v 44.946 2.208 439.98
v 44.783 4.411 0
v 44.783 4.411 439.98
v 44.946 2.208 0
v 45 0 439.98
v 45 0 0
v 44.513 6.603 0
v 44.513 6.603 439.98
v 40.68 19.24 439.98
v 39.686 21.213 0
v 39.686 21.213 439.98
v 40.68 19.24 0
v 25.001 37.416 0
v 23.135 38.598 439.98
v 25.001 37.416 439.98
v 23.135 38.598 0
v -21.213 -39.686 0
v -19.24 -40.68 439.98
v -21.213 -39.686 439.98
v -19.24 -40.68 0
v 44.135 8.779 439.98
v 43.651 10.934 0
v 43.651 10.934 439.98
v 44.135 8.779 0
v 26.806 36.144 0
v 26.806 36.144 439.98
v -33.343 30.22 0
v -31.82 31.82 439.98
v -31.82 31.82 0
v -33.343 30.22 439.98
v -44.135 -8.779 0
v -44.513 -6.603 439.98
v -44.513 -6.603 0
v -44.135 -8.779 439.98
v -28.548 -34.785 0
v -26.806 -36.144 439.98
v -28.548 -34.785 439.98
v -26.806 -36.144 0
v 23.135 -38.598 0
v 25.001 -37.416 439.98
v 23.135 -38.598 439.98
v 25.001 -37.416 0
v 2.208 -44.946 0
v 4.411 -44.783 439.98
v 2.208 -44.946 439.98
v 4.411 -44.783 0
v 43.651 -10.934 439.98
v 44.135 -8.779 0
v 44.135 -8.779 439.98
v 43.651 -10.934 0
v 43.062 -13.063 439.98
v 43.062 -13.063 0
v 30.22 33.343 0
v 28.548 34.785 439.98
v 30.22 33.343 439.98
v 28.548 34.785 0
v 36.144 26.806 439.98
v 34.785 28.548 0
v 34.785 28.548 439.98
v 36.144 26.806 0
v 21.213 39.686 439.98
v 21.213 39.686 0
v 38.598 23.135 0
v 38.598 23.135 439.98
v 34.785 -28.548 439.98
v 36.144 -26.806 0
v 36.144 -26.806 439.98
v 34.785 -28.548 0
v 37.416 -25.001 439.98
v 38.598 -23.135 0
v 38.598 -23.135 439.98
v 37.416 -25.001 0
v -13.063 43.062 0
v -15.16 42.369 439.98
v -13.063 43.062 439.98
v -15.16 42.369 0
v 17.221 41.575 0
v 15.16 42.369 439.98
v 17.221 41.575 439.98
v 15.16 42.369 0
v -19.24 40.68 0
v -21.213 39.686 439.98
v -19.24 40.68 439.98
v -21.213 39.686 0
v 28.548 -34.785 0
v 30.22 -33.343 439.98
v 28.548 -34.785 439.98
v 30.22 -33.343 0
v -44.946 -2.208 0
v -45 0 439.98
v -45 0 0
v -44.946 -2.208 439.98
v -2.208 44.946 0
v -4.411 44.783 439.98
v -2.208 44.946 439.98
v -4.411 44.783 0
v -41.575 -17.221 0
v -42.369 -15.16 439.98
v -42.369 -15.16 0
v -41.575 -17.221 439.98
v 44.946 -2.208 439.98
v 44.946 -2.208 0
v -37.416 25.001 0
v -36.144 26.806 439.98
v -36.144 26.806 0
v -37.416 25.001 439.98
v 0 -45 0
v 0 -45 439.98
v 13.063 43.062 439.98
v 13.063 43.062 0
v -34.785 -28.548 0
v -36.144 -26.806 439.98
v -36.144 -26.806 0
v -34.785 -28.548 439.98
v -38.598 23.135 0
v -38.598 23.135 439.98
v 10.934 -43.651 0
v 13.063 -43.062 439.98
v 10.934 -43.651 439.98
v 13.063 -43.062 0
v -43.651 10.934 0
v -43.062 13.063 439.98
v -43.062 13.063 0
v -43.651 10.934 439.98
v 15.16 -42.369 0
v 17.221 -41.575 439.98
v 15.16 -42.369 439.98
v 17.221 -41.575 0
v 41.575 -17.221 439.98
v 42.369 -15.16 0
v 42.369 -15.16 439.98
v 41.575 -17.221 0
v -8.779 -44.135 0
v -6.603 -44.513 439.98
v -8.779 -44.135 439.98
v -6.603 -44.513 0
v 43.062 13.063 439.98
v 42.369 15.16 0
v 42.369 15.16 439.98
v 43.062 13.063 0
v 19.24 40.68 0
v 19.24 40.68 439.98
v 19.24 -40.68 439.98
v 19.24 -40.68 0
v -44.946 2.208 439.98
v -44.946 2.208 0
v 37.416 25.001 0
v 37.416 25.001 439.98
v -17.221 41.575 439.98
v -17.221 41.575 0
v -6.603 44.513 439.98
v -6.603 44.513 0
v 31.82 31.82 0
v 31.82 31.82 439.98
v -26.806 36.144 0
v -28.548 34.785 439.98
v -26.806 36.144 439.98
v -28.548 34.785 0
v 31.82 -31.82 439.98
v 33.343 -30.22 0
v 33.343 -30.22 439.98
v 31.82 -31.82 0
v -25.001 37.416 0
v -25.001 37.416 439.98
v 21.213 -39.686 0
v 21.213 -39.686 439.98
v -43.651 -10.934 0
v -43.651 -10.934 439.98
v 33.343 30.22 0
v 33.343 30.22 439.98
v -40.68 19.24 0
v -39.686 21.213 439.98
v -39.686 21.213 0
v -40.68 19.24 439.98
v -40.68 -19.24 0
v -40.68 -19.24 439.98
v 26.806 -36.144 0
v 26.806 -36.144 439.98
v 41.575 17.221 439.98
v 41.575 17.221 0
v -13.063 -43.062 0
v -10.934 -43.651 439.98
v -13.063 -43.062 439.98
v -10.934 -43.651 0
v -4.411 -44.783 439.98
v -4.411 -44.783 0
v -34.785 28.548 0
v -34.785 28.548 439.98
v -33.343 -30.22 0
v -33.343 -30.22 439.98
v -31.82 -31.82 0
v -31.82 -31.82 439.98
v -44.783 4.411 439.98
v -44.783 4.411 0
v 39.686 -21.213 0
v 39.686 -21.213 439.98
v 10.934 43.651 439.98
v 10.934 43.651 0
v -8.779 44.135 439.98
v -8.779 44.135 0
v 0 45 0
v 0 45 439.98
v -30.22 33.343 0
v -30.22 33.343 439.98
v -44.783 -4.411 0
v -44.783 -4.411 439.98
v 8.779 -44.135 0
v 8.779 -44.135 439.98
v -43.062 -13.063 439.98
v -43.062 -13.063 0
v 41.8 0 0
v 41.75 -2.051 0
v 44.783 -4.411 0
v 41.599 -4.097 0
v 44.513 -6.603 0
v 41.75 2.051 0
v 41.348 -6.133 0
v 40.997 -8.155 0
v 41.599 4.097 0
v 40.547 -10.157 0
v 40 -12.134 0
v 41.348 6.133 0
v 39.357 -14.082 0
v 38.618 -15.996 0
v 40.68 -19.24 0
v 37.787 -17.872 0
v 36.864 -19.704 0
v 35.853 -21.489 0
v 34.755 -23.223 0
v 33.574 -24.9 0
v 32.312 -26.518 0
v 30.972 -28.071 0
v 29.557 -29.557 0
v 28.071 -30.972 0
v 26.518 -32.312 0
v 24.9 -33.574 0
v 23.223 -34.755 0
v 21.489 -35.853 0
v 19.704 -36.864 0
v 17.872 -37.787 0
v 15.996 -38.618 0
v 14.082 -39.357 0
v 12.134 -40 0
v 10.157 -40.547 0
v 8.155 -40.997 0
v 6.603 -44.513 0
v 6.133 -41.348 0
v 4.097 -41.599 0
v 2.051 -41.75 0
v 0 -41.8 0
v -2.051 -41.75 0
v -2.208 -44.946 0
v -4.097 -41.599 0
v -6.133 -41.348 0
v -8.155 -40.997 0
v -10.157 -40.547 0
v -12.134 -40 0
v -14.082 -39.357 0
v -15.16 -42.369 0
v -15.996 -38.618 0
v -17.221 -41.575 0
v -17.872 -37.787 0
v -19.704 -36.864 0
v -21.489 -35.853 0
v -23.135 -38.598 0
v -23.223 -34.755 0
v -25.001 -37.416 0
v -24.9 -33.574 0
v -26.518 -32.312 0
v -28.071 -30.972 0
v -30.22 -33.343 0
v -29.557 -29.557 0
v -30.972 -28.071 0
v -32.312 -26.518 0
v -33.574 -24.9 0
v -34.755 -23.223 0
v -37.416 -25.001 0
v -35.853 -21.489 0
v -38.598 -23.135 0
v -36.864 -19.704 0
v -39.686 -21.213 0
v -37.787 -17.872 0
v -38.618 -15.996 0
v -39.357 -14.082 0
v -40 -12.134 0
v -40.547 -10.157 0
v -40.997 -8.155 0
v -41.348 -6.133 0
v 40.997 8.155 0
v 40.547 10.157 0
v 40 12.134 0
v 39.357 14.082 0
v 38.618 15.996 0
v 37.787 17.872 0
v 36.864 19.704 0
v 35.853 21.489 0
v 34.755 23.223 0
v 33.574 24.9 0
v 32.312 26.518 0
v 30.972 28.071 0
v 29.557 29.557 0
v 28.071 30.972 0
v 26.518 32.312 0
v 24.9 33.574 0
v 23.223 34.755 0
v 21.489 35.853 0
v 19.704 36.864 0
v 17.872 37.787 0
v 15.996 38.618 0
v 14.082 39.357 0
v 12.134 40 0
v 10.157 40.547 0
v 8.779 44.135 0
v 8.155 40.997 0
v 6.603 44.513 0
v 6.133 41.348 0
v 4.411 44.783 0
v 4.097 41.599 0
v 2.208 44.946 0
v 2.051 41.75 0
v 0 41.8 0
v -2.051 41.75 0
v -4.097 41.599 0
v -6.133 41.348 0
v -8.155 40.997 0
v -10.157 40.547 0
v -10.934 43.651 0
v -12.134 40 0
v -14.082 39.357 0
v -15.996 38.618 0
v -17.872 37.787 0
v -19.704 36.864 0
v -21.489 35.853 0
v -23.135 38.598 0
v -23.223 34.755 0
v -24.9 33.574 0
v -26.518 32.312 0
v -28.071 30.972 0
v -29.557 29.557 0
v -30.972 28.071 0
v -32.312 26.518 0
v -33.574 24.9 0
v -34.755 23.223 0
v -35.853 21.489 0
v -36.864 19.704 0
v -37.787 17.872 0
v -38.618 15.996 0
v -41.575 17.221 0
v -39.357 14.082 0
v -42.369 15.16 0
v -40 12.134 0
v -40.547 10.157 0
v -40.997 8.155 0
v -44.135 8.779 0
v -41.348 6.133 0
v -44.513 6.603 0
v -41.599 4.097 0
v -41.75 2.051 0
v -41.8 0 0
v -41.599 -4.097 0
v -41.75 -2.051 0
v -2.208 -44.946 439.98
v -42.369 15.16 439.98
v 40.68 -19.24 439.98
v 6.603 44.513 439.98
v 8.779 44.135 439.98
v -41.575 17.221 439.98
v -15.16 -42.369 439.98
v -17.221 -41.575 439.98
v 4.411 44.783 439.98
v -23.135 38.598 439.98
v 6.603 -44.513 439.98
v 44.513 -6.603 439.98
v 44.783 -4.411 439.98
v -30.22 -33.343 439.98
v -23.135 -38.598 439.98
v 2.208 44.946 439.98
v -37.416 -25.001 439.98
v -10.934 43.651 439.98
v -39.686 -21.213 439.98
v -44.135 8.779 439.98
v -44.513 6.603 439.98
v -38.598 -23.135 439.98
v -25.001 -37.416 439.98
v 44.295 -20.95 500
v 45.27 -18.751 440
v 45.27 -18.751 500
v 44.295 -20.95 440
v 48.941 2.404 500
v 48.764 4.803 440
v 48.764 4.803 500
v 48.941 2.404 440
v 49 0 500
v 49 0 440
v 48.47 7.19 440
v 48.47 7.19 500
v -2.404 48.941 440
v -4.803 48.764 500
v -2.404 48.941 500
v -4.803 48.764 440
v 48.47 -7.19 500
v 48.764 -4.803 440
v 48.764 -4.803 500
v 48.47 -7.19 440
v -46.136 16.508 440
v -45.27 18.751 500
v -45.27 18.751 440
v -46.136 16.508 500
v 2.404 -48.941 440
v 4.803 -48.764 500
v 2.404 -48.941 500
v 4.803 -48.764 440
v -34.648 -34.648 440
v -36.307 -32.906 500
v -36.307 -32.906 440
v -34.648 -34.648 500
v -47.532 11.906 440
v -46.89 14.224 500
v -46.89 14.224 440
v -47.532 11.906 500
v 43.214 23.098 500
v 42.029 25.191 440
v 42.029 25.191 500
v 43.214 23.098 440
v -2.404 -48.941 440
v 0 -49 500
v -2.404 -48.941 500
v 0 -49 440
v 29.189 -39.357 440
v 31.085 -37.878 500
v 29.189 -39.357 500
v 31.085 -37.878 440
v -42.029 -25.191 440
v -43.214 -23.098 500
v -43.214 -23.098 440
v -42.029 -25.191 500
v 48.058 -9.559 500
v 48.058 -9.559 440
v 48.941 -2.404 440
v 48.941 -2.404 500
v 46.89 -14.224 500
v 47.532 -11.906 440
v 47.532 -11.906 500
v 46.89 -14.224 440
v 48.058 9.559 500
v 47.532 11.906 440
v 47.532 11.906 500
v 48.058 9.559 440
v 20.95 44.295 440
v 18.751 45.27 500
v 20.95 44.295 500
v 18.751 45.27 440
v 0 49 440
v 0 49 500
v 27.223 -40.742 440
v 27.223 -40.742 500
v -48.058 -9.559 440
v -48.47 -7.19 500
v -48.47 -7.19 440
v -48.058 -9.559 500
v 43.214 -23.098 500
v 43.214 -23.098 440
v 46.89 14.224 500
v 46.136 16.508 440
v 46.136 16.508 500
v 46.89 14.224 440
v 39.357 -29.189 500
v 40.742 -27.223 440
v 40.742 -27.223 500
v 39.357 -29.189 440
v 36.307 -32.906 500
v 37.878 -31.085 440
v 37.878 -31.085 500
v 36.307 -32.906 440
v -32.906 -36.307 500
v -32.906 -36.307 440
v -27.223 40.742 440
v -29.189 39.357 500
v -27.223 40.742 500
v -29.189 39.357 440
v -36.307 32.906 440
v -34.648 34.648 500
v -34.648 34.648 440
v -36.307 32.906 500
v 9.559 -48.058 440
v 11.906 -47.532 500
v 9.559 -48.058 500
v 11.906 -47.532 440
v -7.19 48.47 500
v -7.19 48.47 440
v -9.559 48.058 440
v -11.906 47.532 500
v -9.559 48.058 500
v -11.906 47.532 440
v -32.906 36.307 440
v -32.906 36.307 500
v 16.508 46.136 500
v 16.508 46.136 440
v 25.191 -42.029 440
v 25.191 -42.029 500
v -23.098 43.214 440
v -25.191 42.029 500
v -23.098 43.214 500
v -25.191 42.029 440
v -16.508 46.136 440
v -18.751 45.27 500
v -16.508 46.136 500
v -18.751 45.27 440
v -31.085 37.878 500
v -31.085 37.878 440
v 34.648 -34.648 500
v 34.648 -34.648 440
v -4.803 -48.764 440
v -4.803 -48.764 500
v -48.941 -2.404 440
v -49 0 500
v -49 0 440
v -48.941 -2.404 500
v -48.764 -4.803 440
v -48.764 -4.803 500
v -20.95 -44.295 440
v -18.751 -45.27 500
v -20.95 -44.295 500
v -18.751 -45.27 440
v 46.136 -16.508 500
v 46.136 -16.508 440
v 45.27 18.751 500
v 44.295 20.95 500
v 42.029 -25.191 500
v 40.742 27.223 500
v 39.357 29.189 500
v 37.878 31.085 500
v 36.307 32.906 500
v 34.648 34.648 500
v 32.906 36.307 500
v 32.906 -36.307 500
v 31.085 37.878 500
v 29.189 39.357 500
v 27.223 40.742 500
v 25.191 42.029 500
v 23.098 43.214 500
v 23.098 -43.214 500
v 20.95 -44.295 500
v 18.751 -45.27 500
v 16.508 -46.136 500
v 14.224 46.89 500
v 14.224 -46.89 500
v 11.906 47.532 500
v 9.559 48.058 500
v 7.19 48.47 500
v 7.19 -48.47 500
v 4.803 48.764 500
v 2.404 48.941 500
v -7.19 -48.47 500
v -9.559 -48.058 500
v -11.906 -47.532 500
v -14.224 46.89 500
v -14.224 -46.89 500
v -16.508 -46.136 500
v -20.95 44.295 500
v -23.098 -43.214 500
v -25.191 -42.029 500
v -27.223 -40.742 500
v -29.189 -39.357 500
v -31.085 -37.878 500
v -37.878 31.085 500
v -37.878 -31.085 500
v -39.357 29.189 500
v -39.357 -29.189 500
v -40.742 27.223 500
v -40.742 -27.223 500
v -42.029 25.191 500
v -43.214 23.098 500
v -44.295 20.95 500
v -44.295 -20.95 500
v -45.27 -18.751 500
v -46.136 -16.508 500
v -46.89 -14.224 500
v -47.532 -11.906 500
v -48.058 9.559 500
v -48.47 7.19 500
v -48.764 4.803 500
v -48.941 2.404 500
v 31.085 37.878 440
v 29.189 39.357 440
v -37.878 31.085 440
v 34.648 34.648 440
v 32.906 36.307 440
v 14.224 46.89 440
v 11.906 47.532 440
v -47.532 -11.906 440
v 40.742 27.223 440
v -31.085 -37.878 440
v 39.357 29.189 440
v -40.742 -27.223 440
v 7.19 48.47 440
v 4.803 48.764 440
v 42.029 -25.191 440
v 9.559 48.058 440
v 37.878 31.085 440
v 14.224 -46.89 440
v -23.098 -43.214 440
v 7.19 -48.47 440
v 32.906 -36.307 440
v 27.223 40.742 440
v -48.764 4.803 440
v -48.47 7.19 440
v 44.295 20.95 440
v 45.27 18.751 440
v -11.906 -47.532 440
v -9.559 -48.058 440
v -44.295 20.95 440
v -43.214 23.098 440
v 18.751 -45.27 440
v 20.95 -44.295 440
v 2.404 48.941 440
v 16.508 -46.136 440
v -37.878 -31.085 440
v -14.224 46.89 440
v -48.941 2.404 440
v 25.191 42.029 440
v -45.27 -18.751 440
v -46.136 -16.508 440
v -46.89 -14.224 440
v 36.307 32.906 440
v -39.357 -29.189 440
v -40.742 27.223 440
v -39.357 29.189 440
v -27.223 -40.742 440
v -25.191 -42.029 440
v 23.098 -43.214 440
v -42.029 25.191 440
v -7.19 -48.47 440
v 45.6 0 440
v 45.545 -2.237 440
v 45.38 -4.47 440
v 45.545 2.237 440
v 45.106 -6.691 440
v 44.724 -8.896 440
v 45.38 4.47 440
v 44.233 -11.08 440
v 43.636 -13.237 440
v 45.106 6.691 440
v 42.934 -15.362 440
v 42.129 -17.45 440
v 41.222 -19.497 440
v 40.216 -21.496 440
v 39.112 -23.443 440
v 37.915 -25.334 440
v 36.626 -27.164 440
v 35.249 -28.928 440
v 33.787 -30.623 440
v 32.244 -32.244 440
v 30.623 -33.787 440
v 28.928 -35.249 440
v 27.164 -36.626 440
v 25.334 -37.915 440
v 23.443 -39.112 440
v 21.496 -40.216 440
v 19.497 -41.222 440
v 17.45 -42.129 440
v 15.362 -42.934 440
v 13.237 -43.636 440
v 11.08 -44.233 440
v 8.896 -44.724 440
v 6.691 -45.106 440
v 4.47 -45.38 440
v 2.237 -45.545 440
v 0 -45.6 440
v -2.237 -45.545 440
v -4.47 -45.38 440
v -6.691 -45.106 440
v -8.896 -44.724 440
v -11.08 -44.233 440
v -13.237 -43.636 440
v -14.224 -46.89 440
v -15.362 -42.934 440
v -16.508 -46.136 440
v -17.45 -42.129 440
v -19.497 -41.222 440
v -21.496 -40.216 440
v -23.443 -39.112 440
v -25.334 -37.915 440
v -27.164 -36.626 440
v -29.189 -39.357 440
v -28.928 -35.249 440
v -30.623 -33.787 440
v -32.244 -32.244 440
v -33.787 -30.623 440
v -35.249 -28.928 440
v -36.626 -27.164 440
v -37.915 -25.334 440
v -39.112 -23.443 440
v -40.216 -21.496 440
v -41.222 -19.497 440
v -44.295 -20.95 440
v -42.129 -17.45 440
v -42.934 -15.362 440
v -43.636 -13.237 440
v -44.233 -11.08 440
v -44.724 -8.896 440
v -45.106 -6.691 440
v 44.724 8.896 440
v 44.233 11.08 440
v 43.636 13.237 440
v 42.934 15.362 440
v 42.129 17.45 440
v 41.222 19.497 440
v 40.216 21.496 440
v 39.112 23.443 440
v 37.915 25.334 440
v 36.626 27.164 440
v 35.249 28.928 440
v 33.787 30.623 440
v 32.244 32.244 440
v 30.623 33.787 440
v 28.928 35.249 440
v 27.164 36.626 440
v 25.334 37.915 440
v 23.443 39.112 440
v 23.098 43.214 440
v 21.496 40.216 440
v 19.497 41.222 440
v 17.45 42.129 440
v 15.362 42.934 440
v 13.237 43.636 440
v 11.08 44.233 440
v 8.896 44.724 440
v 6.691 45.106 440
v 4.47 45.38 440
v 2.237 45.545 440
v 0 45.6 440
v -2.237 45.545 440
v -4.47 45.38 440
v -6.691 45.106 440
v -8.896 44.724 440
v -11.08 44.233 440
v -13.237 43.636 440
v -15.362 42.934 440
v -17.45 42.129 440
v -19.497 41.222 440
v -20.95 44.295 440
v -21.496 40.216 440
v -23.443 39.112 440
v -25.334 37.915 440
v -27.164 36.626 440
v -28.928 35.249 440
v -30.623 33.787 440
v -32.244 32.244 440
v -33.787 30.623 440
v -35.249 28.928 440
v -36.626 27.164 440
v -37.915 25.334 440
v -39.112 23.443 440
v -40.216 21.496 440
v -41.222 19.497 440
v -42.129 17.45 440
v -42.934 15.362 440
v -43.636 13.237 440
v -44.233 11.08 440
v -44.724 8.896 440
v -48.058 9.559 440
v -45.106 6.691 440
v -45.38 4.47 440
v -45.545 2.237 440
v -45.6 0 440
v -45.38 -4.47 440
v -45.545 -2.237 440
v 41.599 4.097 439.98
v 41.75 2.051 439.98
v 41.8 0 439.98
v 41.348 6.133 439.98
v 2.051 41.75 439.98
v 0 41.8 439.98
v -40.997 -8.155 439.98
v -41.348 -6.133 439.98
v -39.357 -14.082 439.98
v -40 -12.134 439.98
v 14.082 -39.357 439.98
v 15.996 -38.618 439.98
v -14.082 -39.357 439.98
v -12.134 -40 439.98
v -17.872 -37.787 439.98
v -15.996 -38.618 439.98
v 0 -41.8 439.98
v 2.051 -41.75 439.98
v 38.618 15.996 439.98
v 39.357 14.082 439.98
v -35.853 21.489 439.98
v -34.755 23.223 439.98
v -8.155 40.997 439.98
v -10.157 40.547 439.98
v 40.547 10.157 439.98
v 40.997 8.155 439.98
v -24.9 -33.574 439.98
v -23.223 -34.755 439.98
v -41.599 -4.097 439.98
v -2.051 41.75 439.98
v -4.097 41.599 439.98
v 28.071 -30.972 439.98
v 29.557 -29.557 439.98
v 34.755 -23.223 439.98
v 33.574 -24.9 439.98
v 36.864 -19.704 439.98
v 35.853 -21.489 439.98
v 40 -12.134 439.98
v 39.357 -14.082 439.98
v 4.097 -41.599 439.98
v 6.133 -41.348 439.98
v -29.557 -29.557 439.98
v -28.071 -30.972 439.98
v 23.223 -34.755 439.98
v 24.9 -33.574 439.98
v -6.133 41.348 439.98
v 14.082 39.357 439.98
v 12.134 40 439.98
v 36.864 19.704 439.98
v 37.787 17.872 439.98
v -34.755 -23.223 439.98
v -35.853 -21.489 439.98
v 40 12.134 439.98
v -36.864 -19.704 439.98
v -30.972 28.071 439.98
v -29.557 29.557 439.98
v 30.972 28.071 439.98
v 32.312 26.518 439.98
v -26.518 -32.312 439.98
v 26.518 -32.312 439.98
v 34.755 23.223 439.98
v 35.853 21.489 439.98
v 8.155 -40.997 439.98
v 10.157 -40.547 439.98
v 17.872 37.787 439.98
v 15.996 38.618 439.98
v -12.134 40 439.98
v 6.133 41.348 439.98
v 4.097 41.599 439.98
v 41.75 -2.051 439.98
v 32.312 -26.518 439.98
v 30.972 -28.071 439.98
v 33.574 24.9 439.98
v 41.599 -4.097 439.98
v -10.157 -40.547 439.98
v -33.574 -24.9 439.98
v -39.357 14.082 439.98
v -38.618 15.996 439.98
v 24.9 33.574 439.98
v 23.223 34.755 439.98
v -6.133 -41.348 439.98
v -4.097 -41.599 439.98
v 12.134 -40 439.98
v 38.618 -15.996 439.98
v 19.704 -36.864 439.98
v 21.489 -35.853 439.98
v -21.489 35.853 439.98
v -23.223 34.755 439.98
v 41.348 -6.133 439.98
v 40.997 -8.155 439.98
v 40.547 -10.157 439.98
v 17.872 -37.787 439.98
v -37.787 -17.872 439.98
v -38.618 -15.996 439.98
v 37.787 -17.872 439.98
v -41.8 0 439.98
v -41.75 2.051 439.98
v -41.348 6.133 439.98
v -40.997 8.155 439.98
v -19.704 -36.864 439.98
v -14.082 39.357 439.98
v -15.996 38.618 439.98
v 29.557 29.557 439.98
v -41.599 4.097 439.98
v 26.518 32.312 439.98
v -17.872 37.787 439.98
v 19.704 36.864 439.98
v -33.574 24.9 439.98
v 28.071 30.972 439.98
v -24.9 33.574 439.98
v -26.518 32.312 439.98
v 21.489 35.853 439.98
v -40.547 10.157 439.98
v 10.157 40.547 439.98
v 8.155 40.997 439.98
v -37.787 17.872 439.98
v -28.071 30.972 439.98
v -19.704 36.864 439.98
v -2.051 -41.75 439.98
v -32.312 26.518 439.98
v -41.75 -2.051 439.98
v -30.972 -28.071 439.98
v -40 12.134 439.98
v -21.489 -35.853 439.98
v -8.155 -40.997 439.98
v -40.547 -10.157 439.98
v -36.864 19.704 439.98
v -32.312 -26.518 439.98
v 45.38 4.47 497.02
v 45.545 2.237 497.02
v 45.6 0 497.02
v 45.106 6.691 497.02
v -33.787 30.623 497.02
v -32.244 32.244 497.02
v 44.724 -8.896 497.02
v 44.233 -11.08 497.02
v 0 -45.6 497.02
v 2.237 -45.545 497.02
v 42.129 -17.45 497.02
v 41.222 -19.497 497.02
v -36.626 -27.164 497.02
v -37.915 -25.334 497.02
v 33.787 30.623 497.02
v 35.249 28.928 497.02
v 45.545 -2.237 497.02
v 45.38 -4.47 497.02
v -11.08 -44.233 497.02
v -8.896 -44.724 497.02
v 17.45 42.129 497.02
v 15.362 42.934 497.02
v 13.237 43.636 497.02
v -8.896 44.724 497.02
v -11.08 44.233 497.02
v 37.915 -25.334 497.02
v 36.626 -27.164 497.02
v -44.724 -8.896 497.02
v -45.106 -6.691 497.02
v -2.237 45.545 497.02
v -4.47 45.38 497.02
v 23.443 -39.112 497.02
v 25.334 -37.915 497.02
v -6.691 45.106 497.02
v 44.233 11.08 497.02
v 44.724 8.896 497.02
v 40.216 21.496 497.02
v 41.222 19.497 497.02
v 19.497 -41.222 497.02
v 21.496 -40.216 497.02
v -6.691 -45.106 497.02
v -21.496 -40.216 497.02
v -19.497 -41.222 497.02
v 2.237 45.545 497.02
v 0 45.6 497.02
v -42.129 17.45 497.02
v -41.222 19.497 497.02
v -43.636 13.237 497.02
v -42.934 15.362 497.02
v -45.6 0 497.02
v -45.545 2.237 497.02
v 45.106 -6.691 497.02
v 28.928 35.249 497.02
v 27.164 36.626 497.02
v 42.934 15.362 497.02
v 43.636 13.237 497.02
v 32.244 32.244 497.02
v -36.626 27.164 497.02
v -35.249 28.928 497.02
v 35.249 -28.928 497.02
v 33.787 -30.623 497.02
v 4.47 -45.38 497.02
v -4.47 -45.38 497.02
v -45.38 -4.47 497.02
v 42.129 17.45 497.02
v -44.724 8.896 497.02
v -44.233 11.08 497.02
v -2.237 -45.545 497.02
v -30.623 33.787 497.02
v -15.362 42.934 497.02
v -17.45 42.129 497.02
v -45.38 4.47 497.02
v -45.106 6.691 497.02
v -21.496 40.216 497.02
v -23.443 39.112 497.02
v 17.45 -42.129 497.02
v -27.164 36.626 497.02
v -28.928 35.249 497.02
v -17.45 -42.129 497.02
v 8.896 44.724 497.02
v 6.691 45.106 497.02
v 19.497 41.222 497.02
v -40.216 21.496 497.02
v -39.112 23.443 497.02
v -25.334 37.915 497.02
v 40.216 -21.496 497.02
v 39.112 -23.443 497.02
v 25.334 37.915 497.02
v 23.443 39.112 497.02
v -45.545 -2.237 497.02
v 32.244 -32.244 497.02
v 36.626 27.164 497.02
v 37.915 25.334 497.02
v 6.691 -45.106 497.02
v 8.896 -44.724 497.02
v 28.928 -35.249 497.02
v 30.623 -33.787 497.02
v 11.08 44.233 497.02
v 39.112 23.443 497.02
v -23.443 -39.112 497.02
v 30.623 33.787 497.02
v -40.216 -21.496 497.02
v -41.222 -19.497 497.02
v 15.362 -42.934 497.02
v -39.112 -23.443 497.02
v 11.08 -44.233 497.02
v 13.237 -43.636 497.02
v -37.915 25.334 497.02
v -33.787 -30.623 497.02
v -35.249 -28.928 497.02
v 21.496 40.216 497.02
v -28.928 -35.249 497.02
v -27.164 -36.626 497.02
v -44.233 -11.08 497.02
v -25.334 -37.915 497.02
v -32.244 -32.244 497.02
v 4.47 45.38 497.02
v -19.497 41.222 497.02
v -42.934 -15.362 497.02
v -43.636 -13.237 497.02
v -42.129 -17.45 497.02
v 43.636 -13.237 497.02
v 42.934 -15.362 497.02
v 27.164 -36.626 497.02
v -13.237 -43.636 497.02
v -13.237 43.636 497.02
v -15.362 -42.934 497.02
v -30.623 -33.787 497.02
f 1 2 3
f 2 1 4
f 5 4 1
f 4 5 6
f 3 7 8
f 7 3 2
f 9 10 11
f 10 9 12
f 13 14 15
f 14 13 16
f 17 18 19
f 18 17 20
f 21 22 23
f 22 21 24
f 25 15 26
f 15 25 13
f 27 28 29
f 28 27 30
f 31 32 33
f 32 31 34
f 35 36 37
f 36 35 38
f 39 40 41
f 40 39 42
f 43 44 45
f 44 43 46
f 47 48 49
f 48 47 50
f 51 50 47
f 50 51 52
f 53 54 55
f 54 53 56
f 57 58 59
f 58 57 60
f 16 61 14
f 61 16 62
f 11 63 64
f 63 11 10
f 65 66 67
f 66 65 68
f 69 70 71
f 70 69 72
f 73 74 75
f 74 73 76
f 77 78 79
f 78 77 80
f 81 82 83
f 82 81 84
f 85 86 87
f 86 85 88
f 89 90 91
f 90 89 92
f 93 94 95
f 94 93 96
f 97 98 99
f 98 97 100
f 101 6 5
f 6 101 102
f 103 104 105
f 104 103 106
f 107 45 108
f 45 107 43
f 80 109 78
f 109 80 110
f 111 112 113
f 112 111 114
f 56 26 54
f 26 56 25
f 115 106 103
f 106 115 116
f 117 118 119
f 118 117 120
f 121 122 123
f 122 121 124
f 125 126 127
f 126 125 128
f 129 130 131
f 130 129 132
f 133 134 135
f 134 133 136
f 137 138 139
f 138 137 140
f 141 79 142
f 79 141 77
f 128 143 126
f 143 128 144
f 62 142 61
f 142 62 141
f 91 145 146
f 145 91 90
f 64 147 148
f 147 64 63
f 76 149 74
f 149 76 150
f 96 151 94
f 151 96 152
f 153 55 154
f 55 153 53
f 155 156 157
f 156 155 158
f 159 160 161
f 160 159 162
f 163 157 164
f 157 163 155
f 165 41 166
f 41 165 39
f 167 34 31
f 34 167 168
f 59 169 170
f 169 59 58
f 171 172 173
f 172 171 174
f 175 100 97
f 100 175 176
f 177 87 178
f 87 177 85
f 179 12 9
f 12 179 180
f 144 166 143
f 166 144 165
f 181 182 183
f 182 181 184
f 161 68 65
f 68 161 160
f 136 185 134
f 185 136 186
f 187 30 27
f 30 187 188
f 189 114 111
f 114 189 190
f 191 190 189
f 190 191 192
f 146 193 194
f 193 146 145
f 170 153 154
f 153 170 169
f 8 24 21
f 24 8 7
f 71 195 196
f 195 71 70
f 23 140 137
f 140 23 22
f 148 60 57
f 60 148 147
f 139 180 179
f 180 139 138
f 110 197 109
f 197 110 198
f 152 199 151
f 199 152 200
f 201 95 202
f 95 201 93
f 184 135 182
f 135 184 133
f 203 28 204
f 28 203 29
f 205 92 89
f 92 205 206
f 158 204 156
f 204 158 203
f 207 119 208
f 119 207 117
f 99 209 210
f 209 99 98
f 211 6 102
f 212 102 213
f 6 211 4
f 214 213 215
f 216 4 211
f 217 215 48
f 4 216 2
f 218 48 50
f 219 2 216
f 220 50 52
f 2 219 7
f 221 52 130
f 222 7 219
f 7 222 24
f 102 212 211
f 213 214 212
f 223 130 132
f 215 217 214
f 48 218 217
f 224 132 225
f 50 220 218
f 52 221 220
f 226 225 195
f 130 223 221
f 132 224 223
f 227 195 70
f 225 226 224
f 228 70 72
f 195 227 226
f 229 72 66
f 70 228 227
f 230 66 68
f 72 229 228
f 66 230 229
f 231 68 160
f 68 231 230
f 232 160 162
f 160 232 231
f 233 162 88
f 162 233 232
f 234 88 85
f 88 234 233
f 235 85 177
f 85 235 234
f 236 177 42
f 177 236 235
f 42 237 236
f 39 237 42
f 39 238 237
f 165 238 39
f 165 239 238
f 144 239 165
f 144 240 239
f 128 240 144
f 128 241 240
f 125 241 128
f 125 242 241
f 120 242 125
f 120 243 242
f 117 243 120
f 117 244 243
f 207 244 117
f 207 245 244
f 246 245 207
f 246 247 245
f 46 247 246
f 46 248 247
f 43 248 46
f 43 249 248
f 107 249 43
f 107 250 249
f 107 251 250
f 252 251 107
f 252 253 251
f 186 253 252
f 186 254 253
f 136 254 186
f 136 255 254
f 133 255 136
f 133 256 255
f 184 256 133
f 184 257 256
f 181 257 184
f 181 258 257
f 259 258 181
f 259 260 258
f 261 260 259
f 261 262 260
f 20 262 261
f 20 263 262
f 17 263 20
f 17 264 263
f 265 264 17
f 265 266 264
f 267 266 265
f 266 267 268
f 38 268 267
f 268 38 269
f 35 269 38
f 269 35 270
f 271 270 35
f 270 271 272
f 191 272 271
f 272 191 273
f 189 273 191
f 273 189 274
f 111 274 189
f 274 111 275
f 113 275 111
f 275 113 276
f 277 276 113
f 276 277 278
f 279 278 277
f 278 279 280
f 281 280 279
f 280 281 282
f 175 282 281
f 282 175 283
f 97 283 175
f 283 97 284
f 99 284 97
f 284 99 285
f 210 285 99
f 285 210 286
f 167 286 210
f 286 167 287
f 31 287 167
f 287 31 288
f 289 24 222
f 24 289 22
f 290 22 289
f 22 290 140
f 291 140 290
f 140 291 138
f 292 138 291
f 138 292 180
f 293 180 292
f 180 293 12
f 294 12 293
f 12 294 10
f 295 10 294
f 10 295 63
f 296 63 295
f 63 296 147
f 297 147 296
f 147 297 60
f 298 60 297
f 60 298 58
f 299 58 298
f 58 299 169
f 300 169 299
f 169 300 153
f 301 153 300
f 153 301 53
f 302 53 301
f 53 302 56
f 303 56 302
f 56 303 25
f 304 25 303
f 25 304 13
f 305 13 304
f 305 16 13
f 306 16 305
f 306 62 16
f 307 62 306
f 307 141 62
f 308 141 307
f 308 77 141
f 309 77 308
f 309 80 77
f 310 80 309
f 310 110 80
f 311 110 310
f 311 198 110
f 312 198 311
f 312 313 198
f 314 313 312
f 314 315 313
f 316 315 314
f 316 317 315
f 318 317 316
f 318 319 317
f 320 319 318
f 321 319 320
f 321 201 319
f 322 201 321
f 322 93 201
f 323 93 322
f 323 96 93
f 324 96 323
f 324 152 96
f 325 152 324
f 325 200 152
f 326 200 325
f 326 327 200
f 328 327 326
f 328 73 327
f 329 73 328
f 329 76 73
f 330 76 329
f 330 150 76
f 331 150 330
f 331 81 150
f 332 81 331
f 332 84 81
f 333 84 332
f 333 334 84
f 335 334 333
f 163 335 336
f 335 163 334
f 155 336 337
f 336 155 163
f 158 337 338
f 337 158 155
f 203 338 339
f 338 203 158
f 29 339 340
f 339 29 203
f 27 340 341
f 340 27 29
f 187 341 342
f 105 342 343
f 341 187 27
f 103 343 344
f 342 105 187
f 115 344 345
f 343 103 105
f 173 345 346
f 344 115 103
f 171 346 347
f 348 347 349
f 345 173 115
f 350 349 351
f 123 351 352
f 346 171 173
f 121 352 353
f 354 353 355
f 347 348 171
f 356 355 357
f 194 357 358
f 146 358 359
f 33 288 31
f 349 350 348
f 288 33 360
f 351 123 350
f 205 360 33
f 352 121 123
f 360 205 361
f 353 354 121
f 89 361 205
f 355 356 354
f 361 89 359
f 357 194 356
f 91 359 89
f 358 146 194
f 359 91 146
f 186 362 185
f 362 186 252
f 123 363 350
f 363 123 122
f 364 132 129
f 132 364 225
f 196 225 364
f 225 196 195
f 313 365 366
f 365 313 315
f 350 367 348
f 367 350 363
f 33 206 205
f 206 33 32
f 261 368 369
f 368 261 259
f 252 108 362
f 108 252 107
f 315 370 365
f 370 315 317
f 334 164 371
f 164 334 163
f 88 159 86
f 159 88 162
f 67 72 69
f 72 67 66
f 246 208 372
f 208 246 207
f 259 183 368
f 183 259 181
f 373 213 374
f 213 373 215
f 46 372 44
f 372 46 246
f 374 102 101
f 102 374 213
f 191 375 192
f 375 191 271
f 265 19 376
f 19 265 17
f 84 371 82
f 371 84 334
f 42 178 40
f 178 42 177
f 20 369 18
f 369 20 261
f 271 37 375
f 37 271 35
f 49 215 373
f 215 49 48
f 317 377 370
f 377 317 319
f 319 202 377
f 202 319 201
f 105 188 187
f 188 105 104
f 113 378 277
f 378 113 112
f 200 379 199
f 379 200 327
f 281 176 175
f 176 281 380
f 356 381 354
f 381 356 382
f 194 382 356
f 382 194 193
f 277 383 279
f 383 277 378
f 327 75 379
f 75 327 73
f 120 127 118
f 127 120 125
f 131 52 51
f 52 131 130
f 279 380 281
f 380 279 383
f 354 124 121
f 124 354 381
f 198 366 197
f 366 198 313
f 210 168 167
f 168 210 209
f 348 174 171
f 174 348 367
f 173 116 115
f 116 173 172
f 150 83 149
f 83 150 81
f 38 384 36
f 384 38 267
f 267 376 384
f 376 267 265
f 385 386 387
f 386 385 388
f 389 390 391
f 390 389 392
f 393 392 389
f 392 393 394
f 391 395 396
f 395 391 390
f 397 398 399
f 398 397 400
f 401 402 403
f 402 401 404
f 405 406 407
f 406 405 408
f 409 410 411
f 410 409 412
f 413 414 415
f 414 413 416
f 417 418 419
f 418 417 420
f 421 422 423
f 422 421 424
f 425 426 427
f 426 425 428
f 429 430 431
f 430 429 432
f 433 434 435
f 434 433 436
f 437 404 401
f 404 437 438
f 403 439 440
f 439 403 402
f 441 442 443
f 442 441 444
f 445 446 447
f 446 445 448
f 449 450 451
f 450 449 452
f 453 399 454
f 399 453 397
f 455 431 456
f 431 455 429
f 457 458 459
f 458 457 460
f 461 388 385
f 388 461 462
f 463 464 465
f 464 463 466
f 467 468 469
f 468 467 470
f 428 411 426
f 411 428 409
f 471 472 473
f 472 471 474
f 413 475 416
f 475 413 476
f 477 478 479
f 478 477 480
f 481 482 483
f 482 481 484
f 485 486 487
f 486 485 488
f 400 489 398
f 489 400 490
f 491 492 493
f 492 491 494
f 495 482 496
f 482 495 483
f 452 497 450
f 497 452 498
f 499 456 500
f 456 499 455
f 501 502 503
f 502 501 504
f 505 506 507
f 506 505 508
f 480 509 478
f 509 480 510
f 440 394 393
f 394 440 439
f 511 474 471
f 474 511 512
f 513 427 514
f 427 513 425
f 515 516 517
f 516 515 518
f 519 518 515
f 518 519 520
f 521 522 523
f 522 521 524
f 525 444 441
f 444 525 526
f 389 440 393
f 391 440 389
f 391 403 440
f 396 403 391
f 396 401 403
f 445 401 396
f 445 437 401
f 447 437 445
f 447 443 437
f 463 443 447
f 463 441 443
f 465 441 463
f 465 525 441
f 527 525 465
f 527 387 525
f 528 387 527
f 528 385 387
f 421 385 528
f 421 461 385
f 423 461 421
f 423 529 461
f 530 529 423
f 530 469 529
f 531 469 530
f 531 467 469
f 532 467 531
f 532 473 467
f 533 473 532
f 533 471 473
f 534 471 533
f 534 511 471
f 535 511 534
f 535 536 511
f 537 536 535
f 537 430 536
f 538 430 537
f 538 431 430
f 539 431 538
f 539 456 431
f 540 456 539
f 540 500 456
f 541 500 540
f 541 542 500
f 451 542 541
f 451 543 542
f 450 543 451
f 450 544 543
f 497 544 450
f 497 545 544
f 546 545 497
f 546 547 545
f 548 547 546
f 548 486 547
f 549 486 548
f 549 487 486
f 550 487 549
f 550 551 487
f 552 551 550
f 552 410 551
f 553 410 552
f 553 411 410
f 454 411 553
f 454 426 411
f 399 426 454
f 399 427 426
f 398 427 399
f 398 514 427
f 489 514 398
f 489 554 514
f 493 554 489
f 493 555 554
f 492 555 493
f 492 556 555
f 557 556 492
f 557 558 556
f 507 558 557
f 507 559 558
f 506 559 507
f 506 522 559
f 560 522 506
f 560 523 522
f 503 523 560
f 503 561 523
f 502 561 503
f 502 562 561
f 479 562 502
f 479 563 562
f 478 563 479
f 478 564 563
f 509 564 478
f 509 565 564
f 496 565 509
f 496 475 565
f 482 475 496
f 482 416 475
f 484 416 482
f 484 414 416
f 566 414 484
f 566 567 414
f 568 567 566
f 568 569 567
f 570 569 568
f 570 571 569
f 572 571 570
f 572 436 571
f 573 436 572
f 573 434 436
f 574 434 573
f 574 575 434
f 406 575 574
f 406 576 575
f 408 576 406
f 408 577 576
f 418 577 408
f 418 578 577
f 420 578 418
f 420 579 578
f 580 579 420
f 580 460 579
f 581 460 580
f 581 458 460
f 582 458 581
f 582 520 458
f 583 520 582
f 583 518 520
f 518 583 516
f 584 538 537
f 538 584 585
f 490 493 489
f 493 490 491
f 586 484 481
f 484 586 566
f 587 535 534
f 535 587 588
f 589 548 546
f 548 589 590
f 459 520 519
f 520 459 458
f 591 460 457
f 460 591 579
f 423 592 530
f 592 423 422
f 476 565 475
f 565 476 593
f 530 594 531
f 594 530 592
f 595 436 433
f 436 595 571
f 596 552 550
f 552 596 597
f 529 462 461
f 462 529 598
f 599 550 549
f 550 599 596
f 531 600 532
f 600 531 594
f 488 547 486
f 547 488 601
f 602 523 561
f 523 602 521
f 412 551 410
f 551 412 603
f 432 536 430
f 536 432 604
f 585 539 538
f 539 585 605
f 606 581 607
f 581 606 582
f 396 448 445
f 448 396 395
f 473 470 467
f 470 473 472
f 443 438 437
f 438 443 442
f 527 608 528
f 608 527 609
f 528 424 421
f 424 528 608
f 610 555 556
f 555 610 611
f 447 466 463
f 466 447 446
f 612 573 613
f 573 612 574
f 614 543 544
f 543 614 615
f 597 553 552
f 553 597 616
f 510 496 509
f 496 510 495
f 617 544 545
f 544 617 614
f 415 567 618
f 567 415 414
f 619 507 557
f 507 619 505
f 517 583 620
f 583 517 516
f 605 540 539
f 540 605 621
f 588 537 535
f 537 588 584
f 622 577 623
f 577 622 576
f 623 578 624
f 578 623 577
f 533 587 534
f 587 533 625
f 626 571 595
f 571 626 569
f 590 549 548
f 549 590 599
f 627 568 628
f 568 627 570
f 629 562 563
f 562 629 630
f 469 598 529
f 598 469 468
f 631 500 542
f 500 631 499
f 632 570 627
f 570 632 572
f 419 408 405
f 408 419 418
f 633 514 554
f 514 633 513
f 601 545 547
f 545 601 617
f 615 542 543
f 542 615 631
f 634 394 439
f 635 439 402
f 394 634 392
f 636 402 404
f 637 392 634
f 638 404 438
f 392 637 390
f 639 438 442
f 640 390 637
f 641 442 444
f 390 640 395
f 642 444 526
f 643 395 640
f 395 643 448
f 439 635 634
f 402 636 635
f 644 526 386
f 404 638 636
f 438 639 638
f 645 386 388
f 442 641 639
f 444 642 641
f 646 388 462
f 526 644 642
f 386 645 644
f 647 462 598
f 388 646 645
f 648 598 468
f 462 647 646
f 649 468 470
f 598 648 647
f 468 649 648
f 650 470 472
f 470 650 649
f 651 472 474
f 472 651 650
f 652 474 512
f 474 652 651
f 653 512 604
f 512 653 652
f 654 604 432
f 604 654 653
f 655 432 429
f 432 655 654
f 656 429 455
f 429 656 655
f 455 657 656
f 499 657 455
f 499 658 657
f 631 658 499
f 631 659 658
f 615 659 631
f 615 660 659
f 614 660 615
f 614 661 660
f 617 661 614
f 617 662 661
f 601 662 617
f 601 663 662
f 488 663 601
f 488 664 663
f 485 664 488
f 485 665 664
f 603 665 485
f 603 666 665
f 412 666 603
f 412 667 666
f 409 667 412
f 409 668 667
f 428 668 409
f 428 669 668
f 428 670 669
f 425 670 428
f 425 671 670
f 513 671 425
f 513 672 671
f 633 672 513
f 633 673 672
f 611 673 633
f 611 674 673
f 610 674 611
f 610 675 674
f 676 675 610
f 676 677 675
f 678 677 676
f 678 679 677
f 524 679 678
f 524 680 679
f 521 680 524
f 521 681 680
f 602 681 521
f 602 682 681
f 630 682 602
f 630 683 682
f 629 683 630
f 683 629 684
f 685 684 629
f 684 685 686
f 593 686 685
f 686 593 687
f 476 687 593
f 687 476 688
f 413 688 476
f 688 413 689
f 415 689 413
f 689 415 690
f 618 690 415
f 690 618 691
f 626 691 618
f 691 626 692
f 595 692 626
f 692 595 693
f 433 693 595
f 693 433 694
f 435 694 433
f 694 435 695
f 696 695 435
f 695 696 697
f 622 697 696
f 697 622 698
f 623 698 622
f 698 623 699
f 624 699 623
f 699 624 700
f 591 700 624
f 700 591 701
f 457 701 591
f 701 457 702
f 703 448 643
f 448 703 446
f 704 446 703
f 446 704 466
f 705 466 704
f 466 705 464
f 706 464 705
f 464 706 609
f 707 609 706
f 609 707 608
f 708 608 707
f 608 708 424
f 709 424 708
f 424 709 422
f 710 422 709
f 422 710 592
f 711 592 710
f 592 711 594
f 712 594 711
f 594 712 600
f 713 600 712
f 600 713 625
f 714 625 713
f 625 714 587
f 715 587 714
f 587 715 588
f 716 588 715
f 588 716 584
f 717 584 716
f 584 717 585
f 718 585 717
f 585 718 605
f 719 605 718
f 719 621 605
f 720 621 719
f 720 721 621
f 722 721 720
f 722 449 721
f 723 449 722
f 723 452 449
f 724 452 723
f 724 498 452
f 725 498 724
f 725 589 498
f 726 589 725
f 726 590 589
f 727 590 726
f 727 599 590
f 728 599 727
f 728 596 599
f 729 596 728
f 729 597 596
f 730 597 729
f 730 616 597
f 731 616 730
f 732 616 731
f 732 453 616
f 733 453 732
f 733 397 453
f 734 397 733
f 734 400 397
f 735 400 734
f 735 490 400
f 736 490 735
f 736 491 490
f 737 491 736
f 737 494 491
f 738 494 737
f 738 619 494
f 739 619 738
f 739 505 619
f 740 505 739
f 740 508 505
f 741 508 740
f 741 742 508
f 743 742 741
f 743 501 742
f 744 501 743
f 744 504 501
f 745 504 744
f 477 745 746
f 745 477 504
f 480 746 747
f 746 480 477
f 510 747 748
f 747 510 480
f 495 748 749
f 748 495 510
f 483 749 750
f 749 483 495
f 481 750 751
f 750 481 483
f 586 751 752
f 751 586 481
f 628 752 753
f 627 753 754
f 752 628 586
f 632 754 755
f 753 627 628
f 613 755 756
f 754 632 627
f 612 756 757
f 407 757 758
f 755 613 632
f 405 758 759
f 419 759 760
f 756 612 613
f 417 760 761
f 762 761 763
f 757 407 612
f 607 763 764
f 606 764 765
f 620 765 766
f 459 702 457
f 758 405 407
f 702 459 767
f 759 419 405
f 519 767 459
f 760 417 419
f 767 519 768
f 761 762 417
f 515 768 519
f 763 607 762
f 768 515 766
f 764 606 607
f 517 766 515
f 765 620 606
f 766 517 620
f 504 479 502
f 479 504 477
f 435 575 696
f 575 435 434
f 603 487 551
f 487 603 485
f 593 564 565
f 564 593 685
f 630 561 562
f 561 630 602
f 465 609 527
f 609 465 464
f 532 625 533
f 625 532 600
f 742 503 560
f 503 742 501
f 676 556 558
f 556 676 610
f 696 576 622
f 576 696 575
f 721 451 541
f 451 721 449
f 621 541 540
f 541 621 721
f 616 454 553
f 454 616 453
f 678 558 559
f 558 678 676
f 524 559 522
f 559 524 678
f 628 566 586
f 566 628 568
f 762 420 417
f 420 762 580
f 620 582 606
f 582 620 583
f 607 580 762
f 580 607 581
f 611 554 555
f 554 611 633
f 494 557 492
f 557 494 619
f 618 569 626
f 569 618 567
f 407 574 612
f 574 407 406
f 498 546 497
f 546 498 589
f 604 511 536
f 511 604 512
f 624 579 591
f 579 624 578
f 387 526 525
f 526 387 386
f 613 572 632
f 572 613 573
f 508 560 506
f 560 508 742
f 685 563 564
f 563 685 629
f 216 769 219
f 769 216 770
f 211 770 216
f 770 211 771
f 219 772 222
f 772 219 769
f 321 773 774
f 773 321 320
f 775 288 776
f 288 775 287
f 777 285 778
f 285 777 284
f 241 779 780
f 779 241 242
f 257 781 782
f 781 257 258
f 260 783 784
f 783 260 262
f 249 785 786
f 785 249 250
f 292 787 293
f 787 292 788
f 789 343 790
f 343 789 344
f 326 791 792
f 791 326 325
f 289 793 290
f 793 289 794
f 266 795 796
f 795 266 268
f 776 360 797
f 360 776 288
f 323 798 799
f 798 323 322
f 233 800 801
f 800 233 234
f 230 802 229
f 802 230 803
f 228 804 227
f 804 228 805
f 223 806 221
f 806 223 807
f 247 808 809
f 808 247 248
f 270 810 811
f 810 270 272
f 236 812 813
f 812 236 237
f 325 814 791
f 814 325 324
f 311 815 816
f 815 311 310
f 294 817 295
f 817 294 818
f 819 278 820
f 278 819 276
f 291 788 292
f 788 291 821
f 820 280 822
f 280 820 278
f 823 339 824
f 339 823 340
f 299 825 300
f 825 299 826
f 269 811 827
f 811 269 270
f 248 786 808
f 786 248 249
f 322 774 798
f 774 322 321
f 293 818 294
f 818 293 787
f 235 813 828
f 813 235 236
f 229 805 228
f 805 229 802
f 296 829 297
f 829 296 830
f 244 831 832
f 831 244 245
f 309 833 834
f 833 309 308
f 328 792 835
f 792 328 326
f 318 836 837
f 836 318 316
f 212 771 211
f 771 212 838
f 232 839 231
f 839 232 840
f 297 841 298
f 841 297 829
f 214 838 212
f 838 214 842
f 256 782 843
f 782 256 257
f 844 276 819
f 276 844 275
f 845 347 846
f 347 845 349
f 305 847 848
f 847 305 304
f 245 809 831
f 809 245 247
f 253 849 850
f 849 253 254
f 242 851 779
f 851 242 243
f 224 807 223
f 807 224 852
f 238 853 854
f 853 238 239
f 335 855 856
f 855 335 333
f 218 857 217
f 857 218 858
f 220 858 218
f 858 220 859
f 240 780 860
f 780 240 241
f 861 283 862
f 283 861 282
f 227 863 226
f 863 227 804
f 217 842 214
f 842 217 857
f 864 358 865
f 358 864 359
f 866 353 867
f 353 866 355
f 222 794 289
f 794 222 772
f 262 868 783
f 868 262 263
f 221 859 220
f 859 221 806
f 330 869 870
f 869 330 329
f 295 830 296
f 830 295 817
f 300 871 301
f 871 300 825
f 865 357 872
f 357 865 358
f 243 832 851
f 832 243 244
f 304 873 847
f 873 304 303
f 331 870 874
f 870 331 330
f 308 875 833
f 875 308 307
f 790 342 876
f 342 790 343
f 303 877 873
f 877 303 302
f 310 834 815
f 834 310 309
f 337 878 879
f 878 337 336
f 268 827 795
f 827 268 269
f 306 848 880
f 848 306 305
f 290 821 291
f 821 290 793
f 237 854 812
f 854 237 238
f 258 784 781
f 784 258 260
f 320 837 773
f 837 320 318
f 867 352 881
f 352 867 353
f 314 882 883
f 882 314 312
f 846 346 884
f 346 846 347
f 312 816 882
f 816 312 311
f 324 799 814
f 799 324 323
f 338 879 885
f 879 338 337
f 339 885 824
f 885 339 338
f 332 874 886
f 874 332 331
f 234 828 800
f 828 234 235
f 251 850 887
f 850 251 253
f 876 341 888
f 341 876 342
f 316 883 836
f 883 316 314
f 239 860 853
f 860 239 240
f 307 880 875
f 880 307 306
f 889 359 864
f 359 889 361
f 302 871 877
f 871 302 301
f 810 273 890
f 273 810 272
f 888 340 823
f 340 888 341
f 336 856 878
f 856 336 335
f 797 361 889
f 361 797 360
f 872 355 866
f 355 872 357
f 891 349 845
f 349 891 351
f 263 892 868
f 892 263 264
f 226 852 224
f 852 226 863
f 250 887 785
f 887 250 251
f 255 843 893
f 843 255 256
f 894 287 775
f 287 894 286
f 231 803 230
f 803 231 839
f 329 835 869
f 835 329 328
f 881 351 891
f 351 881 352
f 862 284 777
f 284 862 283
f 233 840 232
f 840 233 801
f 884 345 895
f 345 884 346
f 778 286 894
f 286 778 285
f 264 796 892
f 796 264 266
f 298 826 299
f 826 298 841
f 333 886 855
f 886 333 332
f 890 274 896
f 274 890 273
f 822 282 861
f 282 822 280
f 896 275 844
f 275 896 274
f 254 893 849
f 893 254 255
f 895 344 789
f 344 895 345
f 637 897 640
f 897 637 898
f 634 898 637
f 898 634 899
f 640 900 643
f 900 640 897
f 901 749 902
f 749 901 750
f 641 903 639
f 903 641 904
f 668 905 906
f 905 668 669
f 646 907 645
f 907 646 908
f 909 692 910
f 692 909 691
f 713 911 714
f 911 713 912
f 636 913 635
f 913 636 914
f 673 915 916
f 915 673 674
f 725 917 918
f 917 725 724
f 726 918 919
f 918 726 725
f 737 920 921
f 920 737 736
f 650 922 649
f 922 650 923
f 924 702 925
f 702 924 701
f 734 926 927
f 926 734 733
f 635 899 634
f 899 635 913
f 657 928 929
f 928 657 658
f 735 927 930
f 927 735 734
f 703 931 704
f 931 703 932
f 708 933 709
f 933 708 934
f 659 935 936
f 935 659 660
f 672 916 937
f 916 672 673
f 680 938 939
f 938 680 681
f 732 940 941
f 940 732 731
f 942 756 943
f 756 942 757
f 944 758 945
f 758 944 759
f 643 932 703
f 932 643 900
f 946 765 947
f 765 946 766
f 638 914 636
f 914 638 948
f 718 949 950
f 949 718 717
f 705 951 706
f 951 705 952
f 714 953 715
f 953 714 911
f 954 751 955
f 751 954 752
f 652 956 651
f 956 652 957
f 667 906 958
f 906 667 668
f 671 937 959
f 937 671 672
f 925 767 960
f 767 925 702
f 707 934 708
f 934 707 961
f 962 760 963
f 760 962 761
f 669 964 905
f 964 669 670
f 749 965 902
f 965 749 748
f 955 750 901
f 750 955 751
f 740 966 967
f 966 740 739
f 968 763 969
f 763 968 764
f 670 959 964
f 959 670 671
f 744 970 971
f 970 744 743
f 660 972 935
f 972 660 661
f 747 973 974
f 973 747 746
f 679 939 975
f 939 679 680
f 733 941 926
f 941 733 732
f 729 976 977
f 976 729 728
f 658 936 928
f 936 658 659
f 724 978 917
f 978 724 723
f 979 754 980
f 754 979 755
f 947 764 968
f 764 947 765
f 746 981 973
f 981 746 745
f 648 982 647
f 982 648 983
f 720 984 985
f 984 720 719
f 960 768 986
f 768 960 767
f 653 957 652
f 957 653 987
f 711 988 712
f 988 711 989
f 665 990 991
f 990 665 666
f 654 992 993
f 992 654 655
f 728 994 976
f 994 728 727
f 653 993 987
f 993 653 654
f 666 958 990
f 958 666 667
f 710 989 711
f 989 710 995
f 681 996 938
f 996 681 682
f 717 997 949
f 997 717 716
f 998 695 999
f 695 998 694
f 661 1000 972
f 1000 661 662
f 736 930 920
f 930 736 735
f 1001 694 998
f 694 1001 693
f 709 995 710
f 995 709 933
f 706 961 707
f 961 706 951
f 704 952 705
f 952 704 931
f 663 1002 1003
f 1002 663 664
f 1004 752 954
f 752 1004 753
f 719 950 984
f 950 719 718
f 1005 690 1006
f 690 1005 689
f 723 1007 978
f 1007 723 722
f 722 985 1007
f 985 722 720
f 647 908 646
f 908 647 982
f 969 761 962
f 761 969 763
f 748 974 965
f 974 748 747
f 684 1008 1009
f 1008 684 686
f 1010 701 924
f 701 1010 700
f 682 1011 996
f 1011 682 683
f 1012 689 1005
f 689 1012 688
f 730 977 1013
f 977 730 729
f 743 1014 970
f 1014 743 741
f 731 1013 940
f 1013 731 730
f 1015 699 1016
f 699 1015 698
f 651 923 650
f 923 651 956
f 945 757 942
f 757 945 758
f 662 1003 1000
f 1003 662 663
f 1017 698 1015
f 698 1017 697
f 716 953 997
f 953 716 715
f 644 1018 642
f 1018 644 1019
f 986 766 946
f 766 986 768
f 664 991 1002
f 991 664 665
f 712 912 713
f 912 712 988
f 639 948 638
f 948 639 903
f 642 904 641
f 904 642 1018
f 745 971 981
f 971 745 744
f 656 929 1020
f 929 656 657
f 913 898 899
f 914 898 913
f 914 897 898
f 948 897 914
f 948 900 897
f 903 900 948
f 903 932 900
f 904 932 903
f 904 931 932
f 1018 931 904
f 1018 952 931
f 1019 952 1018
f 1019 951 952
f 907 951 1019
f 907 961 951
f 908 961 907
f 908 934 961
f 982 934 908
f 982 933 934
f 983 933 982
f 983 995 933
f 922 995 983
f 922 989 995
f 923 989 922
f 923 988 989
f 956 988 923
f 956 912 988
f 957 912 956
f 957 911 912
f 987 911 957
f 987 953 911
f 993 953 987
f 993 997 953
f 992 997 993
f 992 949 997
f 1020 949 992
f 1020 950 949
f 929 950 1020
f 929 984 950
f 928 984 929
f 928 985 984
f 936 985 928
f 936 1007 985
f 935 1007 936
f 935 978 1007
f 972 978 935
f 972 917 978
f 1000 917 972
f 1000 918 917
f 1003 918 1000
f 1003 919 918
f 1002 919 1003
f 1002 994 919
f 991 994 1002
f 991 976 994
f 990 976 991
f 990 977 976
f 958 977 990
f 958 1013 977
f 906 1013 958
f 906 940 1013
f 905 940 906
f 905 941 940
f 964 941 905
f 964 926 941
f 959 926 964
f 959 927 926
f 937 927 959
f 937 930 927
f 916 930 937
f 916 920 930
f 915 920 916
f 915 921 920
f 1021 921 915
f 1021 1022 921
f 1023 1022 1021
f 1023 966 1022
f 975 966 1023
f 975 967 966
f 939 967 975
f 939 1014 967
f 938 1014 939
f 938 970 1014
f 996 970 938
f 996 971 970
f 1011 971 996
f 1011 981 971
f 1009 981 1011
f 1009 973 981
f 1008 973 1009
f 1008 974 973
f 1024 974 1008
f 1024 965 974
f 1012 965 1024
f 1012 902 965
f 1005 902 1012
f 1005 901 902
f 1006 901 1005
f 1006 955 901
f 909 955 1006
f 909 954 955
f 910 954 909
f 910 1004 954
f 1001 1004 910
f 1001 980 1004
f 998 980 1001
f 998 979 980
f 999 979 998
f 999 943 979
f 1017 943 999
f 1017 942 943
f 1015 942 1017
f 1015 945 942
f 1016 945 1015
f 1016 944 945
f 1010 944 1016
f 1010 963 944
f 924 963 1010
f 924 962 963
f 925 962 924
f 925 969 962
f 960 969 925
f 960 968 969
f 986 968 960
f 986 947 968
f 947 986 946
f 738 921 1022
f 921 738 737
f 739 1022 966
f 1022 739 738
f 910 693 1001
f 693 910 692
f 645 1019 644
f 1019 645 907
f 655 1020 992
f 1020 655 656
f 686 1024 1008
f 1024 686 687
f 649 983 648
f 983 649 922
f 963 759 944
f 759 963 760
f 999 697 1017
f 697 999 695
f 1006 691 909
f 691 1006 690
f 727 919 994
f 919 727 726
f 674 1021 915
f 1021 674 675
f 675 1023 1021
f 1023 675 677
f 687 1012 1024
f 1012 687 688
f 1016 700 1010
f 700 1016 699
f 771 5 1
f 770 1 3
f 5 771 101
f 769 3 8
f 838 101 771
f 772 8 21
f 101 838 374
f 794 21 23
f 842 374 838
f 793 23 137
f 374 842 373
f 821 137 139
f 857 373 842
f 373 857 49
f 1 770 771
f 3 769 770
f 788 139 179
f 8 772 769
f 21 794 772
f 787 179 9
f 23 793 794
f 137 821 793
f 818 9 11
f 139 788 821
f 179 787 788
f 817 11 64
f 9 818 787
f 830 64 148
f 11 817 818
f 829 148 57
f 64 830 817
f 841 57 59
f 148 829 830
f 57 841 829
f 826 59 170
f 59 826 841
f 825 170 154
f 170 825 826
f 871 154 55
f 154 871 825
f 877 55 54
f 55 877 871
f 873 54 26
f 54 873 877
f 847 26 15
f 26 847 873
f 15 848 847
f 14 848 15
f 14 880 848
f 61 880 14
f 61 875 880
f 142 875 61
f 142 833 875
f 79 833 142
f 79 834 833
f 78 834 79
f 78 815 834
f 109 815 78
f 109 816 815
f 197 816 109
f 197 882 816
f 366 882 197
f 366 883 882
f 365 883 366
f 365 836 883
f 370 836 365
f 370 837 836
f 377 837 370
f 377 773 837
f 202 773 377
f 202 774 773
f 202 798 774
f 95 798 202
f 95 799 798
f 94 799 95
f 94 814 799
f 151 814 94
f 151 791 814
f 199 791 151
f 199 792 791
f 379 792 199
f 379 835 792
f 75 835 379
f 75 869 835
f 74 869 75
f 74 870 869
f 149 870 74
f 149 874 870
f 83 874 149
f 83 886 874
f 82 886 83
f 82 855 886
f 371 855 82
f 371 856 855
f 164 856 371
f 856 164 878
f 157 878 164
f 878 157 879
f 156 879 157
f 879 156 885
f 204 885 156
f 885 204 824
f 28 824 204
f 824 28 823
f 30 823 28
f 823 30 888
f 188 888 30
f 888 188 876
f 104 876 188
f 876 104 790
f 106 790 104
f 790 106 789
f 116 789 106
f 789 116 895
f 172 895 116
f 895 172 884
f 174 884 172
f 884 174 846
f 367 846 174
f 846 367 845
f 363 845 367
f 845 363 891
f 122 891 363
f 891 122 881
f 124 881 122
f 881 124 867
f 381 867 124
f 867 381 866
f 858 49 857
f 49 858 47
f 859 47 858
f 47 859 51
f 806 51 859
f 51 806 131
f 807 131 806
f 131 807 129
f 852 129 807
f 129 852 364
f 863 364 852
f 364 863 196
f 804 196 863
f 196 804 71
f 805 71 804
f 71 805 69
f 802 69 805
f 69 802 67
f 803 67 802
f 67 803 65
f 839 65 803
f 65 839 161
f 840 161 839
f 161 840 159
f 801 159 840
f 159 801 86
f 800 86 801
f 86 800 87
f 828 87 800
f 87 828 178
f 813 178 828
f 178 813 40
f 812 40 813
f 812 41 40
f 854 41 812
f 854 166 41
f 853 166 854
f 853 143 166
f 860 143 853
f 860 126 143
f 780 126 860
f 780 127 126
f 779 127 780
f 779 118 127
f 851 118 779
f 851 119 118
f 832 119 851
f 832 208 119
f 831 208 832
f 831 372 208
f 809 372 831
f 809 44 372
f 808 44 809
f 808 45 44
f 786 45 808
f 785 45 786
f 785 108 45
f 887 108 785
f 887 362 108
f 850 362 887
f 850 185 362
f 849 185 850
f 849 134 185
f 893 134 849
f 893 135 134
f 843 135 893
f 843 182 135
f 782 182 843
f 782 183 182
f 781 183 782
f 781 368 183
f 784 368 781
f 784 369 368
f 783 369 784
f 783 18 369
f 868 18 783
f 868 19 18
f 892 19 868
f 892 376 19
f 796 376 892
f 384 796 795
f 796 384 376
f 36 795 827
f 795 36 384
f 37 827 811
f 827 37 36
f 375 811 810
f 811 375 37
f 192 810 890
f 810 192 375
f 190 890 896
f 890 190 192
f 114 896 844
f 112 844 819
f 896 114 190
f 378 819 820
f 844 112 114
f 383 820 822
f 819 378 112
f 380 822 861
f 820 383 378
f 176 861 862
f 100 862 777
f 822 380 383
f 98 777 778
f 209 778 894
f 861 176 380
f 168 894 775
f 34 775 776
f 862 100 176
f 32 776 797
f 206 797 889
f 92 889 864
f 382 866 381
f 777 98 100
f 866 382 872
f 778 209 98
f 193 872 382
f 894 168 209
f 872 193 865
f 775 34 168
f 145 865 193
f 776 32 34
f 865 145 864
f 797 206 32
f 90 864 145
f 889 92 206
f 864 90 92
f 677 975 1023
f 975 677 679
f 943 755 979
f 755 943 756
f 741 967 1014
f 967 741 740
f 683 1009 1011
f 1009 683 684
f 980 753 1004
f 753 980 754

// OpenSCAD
$fn = 128;

// Parameters
nominal_size = 90; //[50:180:1]
length_mm = 500; //[250:1000:1]
pipe_od = 90; //[50:180:1]
wall_thickness = 3.2; //[1.6:6.4:0.1]
socket_od = 98; //[80:140:0.5]
socket_length = 60; //[30:120:1]
socket_wall = 4; //[2:8:0.1]
socket_stop_thickness = 3; //[1:8:0.1]
socket_clearance = 0.6; //[0.2:1.5:0.1]
connection_overlap = 1; //[0.5:2:0.1]

// Small epsilon for robust booleans
eps = 0.02;

// Derived radii
pipe_r  = pipe_od/2;
pipe_ir = max(0.01, pipe_r - wall_thickness);

socket_r  = socket_od/2;
socket_ir = max(0.01, pipe_r + socket_clearance);

// Lengths
socket_len = max(0.01, socket_length);
main_len   = max(0.01, length_mm - socket_len + connection_overlap);

// HT Pipe - ONE connected solid
module ht_pipe() {
  color([0.85, 0.85, 0.8])
  difference() {
    // OUTER SOLID (connected): main OD + socket OD overlapping by connection_overlap
    union() {
      cylinder(h=main_len, r=pipe_r, center=false);

      translate([0, 0, main_len - connection_overlap])
        cylinder(h=socket_len, r=socket_r, center=false);
    }

    // INNER VOID (connected): main bore + socket bore down to stop
    union() {
      // Main pipe bore (open through entire main section)
      translate([0, 0, -eps])
        cylinder(h=main_len + 2*eps, r=pipe_ir, center=false);

      // Socket bore (open from socket mouth down to stop thickness)
      translate([0, 0, main_len - connection_overlap - eps])
        cylinder(h=socket_len - socket_stop_thickness + 2*eps, r=socket_ir, center=false);
    }
  }
}

ht_pipe();
